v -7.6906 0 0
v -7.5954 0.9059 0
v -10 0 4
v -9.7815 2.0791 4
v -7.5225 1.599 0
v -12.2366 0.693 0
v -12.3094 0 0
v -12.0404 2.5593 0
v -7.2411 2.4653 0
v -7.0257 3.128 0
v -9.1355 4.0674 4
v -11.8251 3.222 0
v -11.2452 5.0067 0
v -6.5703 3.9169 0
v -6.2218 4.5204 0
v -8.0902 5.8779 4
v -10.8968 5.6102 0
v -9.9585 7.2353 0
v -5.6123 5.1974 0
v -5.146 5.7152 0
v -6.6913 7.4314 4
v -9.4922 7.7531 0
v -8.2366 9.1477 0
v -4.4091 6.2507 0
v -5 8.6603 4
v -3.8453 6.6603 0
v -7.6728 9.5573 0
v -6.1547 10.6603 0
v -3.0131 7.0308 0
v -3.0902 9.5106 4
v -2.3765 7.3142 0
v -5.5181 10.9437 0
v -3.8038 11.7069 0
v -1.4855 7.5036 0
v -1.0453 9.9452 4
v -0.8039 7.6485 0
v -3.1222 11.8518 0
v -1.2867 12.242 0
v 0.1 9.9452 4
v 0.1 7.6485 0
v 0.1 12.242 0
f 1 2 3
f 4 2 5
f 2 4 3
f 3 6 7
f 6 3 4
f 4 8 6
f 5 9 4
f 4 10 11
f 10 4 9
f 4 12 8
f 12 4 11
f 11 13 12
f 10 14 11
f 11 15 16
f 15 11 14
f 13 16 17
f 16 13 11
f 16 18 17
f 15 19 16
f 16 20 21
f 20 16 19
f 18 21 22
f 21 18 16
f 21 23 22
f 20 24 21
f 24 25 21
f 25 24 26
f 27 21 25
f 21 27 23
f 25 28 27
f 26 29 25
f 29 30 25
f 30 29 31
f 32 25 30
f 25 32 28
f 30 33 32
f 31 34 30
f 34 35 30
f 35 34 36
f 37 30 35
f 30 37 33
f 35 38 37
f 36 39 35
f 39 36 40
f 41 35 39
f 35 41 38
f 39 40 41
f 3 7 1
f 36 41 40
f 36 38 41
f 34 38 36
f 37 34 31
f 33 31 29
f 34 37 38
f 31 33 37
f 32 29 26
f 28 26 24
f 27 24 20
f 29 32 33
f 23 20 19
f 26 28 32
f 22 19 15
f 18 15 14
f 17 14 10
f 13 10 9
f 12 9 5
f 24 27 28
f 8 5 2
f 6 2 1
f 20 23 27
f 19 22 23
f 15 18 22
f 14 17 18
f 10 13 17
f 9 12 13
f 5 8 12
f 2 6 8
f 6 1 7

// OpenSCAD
intersection()
{
    rotate_extrude()
    {
        translate([10,0,0]) triangle(4);
    }
    hull()
    {
        rotate(0) cube([0.1,50,50]);
        rotate(90) cube([0.1,50,50]);
    }
}



module triangle(radius)
{
  o=radius/2;
  a=radius*sqrt(3)/2;
  polygon(points=[[-a,-o],[0,radius],[a,-o]],paths=[[0,1,2]]);
}
